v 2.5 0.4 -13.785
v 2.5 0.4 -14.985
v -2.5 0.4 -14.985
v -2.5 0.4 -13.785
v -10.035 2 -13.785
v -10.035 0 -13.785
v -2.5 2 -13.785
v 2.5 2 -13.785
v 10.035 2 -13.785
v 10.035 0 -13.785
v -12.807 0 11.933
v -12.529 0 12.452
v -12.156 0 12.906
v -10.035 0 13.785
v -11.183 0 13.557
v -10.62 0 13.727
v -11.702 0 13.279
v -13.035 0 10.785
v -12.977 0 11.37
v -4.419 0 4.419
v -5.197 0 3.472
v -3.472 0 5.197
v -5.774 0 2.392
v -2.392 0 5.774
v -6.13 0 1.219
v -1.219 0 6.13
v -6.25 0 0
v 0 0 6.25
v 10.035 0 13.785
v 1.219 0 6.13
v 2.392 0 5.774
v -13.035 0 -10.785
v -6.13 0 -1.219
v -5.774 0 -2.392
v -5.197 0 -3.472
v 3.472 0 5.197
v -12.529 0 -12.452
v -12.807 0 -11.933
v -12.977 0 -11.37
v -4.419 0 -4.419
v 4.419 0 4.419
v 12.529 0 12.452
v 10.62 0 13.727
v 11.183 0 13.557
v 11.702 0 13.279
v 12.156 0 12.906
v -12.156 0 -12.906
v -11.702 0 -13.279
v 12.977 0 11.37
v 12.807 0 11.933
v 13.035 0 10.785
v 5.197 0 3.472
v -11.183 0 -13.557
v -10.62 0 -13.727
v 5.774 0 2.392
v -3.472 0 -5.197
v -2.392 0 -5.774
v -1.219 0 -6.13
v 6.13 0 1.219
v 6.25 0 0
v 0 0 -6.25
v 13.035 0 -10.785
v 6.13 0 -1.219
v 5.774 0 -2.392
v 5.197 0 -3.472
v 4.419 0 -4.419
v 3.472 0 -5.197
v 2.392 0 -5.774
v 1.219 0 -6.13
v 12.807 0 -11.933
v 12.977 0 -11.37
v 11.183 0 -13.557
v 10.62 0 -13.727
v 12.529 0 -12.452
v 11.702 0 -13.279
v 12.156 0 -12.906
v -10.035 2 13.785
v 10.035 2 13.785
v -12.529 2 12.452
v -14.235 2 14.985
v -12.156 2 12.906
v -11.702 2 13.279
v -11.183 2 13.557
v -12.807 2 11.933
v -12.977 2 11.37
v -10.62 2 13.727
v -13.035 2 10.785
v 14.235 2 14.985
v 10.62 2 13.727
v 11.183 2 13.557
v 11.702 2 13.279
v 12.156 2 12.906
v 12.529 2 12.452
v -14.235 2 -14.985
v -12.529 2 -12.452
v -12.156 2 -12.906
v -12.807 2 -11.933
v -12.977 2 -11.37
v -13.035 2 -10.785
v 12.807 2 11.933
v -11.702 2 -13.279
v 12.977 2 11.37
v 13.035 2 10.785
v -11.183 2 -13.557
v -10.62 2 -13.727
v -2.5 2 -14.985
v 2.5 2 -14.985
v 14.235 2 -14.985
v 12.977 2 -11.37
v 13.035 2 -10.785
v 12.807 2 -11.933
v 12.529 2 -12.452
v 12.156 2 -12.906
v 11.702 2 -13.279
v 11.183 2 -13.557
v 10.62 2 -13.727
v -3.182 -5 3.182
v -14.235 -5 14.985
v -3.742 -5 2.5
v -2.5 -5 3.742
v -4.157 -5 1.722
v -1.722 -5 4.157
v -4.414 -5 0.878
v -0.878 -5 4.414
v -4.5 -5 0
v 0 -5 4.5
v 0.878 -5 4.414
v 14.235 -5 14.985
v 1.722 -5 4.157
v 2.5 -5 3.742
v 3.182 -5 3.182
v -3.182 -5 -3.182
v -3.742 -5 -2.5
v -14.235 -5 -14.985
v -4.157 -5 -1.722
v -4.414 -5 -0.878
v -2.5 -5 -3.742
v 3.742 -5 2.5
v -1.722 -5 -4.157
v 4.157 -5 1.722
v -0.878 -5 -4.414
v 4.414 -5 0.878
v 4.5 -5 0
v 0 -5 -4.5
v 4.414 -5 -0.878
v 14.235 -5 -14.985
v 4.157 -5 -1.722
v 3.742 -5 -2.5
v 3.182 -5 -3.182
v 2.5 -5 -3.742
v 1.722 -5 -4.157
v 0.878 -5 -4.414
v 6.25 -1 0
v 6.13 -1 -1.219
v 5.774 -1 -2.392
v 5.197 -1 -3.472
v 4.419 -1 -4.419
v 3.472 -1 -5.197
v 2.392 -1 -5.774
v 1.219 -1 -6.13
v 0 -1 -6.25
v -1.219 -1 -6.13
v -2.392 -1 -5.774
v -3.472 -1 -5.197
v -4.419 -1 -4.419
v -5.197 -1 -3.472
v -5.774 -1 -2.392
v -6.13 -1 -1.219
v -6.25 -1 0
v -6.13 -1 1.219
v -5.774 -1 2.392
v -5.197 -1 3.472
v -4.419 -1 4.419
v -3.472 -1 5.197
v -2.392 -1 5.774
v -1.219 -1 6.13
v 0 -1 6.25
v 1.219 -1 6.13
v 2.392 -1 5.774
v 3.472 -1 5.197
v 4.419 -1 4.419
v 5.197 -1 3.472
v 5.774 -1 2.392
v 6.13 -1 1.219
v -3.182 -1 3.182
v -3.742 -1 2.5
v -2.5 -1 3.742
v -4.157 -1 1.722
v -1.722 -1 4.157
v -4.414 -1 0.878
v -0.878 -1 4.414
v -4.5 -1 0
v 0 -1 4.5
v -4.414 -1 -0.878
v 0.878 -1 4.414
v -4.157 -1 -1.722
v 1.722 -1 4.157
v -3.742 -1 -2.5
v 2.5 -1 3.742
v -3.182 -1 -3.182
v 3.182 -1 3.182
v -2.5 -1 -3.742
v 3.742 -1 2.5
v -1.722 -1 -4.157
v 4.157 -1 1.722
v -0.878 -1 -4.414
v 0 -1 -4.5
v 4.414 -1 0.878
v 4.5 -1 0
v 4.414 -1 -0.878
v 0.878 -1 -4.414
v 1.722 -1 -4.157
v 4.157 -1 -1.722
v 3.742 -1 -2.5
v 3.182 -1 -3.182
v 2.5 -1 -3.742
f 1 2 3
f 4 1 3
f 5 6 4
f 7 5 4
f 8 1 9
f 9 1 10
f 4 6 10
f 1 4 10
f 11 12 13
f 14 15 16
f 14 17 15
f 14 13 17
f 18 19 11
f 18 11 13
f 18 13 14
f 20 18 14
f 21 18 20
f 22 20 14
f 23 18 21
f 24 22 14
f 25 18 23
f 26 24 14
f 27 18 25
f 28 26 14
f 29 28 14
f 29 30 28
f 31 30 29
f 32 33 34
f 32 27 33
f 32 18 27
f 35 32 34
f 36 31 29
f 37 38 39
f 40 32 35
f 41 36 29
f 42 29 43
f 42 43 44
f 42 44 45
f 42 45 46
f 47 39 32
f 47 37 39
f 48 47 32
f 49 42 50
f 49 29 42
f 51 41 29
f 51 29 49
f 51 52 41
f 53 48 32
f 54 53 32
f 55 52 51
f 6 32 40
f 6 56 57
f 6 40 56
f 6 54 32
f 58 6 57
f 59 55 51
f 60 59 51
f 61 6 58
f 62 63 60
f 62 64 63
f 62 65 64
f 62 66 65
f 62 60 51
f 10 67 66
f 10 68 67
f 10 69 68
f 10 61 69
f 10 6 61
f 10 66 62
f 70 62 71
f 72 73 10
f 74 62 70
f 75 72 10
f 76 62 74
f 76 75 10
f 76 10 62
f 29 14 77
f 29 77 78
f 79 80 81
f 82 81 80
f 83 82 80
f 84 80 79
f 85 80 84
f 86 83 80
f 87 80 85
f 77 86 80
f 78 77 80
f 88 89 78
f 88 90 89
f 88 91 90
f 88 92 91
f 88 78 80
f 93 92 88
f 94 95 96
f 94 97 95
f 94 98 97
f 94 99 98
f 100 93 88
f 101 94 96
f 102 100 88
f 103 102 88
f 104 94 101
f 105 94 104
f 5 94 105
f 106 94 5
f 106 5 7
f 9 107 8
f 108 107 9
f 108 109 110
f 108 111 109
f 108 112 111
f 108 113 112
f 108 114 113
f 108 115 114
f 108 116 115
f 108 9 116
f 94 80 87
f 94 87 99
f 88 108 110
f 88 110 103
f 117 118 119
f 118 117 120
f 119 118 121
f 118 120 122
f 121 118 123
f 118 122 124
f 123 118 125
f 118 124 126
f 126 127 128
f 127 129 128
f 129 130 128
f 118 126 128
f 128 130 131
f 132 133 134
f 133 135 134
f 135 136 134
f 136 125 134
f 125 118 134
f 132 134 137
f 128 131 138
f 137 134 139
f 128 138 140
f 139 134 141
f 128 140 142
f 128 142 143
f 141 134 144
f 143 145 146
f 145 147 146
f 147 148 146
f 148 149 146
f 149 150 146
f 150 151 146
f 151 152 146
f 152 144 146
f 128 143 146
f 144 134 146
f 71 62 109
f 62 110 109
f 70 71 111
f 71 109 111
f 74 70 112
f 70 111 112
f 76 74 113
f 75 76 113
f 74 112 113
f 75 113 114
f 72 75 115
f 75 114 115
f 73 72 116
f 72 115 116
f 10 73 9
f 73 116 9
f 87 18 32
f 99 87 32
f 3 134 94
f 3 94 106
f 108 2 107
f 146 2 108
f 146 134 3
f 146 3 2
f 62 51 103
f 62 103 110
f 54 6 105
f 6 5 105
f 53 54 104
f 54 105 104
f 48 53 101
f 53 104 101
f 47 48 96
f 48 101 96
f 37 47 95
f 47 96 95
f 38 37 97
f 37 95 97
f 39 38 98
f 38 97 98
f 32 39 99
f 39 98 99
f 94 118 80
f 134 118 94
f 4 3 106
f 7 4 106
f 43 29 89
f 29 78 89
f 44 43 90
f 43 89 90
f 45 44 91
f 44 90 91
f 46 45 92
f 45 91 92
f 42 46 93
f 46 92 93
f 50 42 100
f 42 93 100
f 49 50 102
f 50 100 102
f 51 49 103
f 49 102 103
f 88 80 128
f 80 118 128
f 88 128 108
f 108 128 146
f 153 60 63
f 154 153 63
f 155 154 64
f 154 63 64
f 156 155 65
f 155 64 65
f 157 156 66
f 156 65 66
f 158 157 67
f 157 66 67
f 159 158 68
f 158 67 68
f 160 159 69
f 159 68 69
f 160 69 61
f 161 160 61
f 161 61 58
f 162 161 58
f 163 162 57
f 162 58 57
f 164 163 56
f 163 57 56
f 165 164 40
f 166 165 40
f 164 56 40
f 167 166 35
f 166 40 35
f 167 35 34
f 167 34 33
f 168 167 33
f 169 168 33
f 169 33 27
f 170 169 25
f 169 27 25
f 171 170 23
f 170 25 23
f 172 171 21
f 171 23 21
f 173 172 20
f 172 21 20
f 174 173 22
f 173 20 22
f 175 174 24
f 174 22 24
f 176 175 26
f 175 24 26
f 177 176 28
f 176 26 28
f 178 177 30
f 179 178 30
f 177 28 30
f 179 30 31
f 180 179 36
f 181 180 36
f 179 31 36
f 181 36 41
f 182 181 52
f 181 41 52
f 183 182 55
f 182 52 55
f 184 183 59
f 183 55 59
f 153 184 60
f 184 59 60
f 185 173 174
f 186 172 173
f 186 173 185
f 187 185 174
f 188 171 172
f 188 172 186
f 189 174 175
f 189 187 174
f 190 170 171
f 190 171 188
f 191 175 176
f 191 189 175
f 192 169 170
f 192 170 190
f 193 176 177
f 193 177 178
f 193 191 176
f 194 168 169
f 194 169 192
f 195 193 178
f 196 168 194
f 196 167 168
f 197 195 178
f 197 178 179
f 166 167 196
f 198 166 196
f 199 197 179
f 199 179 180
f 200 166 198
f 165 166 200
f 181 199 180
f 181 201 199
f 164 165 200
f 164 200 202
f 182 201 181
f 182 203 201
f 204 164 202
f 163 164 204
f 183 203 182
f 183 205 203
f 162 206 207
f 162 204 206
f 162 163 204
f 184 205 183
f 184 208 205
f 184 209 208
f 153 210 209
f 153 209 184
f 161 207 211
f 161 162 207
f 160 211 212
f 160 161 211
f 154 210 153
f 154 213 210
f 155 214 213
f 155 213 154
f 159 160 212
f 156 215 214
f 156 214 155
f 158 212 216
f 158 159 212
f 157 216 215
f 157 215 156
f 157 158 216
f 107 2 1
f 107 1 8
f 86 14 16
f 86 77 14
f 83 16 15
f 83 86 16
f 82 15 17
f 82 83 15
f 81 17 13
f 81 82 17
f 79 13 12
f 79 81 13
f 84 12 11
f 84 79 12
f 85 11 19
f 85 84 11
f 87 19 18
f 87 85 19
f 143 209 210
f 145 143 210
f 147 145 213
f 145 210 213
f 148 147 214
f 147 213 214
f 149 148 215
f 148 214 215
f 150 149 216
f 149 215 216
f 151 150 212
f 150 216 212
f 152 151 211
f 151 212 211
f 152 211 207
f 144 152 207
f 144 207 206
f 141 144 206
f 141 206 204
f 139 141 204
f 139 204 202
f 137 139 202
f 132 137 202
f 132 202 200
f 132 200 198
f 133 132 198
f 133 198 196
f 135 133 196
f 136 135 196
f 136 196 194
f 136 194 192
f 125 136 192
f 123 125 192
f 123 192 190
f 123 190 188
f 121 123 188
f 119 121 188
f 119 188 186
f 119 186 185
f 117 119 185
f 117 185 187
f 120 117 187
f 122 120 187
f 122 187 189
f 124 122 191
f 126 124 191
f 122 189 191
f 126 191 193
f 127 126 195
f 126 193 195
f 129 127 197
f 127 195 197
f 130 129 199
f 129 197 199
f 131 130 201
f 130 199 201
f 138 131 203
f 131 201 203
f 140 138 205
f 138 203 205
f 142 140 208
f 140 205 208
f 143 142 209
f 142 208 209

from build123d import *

# Parameters (mm, degrees)
SKETCH1_W           = 28.47
SKETCH1_H           = 29.97
BOSS_EXTRUDE1_DEPTH = 5
CUT_EXTRUDE1_REACH  = 7
SKETCH2_R           = 4.5
SKETCH4_W           = 28.47
SKETCH4_H           = 29.97
SKETCH4_W_2         = 26.07
SKETCH4_H_2         = 27.57
BOSS_EXTRUDE2_DEPTH = 2
SKETCH7_R           = 6.25
CUT_EXTRUDE5_DEPTH  = 1
FILLET1_R           = 3
SKETCH8_W           = 5
SKETCH8_H           = 1.6
CUT_EXTRUDE6_DEPTH  = 1.2


with BuildPart() as part:
    # Sketch1 → Boss-Extrude1 (new body)
    with BuildSketch(Plane(origin=(0, 0, 0), x_dir=(1, 0, 0), z_dir=(0, 1, 0))):
        Rectangle(SKETCH1_W, SKETCH1_H)
    extrude(amount=-BOSS_EXTRUDE1_DEPTH)

    # Sketch2 → Cut-Extrude1 (cut, up to next)
    with BuildSketch(Plane(origin=(0, 0, 0), x_dir=(1, 0, 0), z_dir=(0, 1, 0)), mode=Mode.PRIVATE) as cut_extrude1_sk1:
        Circle(SKETCH2_R)
    cut_extrude1_tool1 = extrude(cut_extrude1_sk1.sketch, amount=-CUT_EXTRUDE1_REACH, mode=Mode.PRIVATE) & part.part
    add(cut_extrude1_tool1.solids().sort_by_distance((0, 0, 0))[0], mode=Mode.SUBTRACT)

    # Sketch4 → Boss-Extrude2 (add)
    with BuildSketch(Plane(origin=(0, 0, 0), x_dir=(1, 0, 0), z_dir=(0, 1, 0))):
        Rectangle(SKETCH4_W, SKETCH4_H)
        Rectangle(SKETCH4_W_2, SKETCH4_H_2, mode=Mode.SUBTRACT)
    extrude(amount=BOSS_EXTRUDE2_DEPTH)

    # Sketch7 → Cut-Extrude5 (cut)
    with BuildSketch(Plane(origin=(0, 0, 0), x_dir=(1, 0, 0), z_dir=(0, 1, 0))):
        Circle(SKETCH7_R)
    extrude(amount=-CUT_EXTRUDE5_DEPTH, mode=Mode.SUBTRACT)

    # Fillet1
    fillet1_edges = [part.edges().sort_by_distance(p)[0] for p in [
        (13.035, 1, -13.785),
        (-13.035, 1, -13.785),
        (-13.035, 1, 13.785),
        (13.035, 1, 13.785),
    ]]
    fillet(fillet1_edges, radius=FILLET1_R)

    # Sketch8 → Cut-Extrude6 (cut)
    with BuildSketch(Plane(origin=(0, 0, -14.985), x_dir=(-1, 0, 0), z_dir=(0, 0, -1))):
        with Locations((0, 1.2)):
            Rectangle(SKETCH8_W, SKETCH8_H)
    extrude(amount=-CUT_EXTRUDE6_DEPTH, mode=Mode.SUBTRACT)


solid = part.part
